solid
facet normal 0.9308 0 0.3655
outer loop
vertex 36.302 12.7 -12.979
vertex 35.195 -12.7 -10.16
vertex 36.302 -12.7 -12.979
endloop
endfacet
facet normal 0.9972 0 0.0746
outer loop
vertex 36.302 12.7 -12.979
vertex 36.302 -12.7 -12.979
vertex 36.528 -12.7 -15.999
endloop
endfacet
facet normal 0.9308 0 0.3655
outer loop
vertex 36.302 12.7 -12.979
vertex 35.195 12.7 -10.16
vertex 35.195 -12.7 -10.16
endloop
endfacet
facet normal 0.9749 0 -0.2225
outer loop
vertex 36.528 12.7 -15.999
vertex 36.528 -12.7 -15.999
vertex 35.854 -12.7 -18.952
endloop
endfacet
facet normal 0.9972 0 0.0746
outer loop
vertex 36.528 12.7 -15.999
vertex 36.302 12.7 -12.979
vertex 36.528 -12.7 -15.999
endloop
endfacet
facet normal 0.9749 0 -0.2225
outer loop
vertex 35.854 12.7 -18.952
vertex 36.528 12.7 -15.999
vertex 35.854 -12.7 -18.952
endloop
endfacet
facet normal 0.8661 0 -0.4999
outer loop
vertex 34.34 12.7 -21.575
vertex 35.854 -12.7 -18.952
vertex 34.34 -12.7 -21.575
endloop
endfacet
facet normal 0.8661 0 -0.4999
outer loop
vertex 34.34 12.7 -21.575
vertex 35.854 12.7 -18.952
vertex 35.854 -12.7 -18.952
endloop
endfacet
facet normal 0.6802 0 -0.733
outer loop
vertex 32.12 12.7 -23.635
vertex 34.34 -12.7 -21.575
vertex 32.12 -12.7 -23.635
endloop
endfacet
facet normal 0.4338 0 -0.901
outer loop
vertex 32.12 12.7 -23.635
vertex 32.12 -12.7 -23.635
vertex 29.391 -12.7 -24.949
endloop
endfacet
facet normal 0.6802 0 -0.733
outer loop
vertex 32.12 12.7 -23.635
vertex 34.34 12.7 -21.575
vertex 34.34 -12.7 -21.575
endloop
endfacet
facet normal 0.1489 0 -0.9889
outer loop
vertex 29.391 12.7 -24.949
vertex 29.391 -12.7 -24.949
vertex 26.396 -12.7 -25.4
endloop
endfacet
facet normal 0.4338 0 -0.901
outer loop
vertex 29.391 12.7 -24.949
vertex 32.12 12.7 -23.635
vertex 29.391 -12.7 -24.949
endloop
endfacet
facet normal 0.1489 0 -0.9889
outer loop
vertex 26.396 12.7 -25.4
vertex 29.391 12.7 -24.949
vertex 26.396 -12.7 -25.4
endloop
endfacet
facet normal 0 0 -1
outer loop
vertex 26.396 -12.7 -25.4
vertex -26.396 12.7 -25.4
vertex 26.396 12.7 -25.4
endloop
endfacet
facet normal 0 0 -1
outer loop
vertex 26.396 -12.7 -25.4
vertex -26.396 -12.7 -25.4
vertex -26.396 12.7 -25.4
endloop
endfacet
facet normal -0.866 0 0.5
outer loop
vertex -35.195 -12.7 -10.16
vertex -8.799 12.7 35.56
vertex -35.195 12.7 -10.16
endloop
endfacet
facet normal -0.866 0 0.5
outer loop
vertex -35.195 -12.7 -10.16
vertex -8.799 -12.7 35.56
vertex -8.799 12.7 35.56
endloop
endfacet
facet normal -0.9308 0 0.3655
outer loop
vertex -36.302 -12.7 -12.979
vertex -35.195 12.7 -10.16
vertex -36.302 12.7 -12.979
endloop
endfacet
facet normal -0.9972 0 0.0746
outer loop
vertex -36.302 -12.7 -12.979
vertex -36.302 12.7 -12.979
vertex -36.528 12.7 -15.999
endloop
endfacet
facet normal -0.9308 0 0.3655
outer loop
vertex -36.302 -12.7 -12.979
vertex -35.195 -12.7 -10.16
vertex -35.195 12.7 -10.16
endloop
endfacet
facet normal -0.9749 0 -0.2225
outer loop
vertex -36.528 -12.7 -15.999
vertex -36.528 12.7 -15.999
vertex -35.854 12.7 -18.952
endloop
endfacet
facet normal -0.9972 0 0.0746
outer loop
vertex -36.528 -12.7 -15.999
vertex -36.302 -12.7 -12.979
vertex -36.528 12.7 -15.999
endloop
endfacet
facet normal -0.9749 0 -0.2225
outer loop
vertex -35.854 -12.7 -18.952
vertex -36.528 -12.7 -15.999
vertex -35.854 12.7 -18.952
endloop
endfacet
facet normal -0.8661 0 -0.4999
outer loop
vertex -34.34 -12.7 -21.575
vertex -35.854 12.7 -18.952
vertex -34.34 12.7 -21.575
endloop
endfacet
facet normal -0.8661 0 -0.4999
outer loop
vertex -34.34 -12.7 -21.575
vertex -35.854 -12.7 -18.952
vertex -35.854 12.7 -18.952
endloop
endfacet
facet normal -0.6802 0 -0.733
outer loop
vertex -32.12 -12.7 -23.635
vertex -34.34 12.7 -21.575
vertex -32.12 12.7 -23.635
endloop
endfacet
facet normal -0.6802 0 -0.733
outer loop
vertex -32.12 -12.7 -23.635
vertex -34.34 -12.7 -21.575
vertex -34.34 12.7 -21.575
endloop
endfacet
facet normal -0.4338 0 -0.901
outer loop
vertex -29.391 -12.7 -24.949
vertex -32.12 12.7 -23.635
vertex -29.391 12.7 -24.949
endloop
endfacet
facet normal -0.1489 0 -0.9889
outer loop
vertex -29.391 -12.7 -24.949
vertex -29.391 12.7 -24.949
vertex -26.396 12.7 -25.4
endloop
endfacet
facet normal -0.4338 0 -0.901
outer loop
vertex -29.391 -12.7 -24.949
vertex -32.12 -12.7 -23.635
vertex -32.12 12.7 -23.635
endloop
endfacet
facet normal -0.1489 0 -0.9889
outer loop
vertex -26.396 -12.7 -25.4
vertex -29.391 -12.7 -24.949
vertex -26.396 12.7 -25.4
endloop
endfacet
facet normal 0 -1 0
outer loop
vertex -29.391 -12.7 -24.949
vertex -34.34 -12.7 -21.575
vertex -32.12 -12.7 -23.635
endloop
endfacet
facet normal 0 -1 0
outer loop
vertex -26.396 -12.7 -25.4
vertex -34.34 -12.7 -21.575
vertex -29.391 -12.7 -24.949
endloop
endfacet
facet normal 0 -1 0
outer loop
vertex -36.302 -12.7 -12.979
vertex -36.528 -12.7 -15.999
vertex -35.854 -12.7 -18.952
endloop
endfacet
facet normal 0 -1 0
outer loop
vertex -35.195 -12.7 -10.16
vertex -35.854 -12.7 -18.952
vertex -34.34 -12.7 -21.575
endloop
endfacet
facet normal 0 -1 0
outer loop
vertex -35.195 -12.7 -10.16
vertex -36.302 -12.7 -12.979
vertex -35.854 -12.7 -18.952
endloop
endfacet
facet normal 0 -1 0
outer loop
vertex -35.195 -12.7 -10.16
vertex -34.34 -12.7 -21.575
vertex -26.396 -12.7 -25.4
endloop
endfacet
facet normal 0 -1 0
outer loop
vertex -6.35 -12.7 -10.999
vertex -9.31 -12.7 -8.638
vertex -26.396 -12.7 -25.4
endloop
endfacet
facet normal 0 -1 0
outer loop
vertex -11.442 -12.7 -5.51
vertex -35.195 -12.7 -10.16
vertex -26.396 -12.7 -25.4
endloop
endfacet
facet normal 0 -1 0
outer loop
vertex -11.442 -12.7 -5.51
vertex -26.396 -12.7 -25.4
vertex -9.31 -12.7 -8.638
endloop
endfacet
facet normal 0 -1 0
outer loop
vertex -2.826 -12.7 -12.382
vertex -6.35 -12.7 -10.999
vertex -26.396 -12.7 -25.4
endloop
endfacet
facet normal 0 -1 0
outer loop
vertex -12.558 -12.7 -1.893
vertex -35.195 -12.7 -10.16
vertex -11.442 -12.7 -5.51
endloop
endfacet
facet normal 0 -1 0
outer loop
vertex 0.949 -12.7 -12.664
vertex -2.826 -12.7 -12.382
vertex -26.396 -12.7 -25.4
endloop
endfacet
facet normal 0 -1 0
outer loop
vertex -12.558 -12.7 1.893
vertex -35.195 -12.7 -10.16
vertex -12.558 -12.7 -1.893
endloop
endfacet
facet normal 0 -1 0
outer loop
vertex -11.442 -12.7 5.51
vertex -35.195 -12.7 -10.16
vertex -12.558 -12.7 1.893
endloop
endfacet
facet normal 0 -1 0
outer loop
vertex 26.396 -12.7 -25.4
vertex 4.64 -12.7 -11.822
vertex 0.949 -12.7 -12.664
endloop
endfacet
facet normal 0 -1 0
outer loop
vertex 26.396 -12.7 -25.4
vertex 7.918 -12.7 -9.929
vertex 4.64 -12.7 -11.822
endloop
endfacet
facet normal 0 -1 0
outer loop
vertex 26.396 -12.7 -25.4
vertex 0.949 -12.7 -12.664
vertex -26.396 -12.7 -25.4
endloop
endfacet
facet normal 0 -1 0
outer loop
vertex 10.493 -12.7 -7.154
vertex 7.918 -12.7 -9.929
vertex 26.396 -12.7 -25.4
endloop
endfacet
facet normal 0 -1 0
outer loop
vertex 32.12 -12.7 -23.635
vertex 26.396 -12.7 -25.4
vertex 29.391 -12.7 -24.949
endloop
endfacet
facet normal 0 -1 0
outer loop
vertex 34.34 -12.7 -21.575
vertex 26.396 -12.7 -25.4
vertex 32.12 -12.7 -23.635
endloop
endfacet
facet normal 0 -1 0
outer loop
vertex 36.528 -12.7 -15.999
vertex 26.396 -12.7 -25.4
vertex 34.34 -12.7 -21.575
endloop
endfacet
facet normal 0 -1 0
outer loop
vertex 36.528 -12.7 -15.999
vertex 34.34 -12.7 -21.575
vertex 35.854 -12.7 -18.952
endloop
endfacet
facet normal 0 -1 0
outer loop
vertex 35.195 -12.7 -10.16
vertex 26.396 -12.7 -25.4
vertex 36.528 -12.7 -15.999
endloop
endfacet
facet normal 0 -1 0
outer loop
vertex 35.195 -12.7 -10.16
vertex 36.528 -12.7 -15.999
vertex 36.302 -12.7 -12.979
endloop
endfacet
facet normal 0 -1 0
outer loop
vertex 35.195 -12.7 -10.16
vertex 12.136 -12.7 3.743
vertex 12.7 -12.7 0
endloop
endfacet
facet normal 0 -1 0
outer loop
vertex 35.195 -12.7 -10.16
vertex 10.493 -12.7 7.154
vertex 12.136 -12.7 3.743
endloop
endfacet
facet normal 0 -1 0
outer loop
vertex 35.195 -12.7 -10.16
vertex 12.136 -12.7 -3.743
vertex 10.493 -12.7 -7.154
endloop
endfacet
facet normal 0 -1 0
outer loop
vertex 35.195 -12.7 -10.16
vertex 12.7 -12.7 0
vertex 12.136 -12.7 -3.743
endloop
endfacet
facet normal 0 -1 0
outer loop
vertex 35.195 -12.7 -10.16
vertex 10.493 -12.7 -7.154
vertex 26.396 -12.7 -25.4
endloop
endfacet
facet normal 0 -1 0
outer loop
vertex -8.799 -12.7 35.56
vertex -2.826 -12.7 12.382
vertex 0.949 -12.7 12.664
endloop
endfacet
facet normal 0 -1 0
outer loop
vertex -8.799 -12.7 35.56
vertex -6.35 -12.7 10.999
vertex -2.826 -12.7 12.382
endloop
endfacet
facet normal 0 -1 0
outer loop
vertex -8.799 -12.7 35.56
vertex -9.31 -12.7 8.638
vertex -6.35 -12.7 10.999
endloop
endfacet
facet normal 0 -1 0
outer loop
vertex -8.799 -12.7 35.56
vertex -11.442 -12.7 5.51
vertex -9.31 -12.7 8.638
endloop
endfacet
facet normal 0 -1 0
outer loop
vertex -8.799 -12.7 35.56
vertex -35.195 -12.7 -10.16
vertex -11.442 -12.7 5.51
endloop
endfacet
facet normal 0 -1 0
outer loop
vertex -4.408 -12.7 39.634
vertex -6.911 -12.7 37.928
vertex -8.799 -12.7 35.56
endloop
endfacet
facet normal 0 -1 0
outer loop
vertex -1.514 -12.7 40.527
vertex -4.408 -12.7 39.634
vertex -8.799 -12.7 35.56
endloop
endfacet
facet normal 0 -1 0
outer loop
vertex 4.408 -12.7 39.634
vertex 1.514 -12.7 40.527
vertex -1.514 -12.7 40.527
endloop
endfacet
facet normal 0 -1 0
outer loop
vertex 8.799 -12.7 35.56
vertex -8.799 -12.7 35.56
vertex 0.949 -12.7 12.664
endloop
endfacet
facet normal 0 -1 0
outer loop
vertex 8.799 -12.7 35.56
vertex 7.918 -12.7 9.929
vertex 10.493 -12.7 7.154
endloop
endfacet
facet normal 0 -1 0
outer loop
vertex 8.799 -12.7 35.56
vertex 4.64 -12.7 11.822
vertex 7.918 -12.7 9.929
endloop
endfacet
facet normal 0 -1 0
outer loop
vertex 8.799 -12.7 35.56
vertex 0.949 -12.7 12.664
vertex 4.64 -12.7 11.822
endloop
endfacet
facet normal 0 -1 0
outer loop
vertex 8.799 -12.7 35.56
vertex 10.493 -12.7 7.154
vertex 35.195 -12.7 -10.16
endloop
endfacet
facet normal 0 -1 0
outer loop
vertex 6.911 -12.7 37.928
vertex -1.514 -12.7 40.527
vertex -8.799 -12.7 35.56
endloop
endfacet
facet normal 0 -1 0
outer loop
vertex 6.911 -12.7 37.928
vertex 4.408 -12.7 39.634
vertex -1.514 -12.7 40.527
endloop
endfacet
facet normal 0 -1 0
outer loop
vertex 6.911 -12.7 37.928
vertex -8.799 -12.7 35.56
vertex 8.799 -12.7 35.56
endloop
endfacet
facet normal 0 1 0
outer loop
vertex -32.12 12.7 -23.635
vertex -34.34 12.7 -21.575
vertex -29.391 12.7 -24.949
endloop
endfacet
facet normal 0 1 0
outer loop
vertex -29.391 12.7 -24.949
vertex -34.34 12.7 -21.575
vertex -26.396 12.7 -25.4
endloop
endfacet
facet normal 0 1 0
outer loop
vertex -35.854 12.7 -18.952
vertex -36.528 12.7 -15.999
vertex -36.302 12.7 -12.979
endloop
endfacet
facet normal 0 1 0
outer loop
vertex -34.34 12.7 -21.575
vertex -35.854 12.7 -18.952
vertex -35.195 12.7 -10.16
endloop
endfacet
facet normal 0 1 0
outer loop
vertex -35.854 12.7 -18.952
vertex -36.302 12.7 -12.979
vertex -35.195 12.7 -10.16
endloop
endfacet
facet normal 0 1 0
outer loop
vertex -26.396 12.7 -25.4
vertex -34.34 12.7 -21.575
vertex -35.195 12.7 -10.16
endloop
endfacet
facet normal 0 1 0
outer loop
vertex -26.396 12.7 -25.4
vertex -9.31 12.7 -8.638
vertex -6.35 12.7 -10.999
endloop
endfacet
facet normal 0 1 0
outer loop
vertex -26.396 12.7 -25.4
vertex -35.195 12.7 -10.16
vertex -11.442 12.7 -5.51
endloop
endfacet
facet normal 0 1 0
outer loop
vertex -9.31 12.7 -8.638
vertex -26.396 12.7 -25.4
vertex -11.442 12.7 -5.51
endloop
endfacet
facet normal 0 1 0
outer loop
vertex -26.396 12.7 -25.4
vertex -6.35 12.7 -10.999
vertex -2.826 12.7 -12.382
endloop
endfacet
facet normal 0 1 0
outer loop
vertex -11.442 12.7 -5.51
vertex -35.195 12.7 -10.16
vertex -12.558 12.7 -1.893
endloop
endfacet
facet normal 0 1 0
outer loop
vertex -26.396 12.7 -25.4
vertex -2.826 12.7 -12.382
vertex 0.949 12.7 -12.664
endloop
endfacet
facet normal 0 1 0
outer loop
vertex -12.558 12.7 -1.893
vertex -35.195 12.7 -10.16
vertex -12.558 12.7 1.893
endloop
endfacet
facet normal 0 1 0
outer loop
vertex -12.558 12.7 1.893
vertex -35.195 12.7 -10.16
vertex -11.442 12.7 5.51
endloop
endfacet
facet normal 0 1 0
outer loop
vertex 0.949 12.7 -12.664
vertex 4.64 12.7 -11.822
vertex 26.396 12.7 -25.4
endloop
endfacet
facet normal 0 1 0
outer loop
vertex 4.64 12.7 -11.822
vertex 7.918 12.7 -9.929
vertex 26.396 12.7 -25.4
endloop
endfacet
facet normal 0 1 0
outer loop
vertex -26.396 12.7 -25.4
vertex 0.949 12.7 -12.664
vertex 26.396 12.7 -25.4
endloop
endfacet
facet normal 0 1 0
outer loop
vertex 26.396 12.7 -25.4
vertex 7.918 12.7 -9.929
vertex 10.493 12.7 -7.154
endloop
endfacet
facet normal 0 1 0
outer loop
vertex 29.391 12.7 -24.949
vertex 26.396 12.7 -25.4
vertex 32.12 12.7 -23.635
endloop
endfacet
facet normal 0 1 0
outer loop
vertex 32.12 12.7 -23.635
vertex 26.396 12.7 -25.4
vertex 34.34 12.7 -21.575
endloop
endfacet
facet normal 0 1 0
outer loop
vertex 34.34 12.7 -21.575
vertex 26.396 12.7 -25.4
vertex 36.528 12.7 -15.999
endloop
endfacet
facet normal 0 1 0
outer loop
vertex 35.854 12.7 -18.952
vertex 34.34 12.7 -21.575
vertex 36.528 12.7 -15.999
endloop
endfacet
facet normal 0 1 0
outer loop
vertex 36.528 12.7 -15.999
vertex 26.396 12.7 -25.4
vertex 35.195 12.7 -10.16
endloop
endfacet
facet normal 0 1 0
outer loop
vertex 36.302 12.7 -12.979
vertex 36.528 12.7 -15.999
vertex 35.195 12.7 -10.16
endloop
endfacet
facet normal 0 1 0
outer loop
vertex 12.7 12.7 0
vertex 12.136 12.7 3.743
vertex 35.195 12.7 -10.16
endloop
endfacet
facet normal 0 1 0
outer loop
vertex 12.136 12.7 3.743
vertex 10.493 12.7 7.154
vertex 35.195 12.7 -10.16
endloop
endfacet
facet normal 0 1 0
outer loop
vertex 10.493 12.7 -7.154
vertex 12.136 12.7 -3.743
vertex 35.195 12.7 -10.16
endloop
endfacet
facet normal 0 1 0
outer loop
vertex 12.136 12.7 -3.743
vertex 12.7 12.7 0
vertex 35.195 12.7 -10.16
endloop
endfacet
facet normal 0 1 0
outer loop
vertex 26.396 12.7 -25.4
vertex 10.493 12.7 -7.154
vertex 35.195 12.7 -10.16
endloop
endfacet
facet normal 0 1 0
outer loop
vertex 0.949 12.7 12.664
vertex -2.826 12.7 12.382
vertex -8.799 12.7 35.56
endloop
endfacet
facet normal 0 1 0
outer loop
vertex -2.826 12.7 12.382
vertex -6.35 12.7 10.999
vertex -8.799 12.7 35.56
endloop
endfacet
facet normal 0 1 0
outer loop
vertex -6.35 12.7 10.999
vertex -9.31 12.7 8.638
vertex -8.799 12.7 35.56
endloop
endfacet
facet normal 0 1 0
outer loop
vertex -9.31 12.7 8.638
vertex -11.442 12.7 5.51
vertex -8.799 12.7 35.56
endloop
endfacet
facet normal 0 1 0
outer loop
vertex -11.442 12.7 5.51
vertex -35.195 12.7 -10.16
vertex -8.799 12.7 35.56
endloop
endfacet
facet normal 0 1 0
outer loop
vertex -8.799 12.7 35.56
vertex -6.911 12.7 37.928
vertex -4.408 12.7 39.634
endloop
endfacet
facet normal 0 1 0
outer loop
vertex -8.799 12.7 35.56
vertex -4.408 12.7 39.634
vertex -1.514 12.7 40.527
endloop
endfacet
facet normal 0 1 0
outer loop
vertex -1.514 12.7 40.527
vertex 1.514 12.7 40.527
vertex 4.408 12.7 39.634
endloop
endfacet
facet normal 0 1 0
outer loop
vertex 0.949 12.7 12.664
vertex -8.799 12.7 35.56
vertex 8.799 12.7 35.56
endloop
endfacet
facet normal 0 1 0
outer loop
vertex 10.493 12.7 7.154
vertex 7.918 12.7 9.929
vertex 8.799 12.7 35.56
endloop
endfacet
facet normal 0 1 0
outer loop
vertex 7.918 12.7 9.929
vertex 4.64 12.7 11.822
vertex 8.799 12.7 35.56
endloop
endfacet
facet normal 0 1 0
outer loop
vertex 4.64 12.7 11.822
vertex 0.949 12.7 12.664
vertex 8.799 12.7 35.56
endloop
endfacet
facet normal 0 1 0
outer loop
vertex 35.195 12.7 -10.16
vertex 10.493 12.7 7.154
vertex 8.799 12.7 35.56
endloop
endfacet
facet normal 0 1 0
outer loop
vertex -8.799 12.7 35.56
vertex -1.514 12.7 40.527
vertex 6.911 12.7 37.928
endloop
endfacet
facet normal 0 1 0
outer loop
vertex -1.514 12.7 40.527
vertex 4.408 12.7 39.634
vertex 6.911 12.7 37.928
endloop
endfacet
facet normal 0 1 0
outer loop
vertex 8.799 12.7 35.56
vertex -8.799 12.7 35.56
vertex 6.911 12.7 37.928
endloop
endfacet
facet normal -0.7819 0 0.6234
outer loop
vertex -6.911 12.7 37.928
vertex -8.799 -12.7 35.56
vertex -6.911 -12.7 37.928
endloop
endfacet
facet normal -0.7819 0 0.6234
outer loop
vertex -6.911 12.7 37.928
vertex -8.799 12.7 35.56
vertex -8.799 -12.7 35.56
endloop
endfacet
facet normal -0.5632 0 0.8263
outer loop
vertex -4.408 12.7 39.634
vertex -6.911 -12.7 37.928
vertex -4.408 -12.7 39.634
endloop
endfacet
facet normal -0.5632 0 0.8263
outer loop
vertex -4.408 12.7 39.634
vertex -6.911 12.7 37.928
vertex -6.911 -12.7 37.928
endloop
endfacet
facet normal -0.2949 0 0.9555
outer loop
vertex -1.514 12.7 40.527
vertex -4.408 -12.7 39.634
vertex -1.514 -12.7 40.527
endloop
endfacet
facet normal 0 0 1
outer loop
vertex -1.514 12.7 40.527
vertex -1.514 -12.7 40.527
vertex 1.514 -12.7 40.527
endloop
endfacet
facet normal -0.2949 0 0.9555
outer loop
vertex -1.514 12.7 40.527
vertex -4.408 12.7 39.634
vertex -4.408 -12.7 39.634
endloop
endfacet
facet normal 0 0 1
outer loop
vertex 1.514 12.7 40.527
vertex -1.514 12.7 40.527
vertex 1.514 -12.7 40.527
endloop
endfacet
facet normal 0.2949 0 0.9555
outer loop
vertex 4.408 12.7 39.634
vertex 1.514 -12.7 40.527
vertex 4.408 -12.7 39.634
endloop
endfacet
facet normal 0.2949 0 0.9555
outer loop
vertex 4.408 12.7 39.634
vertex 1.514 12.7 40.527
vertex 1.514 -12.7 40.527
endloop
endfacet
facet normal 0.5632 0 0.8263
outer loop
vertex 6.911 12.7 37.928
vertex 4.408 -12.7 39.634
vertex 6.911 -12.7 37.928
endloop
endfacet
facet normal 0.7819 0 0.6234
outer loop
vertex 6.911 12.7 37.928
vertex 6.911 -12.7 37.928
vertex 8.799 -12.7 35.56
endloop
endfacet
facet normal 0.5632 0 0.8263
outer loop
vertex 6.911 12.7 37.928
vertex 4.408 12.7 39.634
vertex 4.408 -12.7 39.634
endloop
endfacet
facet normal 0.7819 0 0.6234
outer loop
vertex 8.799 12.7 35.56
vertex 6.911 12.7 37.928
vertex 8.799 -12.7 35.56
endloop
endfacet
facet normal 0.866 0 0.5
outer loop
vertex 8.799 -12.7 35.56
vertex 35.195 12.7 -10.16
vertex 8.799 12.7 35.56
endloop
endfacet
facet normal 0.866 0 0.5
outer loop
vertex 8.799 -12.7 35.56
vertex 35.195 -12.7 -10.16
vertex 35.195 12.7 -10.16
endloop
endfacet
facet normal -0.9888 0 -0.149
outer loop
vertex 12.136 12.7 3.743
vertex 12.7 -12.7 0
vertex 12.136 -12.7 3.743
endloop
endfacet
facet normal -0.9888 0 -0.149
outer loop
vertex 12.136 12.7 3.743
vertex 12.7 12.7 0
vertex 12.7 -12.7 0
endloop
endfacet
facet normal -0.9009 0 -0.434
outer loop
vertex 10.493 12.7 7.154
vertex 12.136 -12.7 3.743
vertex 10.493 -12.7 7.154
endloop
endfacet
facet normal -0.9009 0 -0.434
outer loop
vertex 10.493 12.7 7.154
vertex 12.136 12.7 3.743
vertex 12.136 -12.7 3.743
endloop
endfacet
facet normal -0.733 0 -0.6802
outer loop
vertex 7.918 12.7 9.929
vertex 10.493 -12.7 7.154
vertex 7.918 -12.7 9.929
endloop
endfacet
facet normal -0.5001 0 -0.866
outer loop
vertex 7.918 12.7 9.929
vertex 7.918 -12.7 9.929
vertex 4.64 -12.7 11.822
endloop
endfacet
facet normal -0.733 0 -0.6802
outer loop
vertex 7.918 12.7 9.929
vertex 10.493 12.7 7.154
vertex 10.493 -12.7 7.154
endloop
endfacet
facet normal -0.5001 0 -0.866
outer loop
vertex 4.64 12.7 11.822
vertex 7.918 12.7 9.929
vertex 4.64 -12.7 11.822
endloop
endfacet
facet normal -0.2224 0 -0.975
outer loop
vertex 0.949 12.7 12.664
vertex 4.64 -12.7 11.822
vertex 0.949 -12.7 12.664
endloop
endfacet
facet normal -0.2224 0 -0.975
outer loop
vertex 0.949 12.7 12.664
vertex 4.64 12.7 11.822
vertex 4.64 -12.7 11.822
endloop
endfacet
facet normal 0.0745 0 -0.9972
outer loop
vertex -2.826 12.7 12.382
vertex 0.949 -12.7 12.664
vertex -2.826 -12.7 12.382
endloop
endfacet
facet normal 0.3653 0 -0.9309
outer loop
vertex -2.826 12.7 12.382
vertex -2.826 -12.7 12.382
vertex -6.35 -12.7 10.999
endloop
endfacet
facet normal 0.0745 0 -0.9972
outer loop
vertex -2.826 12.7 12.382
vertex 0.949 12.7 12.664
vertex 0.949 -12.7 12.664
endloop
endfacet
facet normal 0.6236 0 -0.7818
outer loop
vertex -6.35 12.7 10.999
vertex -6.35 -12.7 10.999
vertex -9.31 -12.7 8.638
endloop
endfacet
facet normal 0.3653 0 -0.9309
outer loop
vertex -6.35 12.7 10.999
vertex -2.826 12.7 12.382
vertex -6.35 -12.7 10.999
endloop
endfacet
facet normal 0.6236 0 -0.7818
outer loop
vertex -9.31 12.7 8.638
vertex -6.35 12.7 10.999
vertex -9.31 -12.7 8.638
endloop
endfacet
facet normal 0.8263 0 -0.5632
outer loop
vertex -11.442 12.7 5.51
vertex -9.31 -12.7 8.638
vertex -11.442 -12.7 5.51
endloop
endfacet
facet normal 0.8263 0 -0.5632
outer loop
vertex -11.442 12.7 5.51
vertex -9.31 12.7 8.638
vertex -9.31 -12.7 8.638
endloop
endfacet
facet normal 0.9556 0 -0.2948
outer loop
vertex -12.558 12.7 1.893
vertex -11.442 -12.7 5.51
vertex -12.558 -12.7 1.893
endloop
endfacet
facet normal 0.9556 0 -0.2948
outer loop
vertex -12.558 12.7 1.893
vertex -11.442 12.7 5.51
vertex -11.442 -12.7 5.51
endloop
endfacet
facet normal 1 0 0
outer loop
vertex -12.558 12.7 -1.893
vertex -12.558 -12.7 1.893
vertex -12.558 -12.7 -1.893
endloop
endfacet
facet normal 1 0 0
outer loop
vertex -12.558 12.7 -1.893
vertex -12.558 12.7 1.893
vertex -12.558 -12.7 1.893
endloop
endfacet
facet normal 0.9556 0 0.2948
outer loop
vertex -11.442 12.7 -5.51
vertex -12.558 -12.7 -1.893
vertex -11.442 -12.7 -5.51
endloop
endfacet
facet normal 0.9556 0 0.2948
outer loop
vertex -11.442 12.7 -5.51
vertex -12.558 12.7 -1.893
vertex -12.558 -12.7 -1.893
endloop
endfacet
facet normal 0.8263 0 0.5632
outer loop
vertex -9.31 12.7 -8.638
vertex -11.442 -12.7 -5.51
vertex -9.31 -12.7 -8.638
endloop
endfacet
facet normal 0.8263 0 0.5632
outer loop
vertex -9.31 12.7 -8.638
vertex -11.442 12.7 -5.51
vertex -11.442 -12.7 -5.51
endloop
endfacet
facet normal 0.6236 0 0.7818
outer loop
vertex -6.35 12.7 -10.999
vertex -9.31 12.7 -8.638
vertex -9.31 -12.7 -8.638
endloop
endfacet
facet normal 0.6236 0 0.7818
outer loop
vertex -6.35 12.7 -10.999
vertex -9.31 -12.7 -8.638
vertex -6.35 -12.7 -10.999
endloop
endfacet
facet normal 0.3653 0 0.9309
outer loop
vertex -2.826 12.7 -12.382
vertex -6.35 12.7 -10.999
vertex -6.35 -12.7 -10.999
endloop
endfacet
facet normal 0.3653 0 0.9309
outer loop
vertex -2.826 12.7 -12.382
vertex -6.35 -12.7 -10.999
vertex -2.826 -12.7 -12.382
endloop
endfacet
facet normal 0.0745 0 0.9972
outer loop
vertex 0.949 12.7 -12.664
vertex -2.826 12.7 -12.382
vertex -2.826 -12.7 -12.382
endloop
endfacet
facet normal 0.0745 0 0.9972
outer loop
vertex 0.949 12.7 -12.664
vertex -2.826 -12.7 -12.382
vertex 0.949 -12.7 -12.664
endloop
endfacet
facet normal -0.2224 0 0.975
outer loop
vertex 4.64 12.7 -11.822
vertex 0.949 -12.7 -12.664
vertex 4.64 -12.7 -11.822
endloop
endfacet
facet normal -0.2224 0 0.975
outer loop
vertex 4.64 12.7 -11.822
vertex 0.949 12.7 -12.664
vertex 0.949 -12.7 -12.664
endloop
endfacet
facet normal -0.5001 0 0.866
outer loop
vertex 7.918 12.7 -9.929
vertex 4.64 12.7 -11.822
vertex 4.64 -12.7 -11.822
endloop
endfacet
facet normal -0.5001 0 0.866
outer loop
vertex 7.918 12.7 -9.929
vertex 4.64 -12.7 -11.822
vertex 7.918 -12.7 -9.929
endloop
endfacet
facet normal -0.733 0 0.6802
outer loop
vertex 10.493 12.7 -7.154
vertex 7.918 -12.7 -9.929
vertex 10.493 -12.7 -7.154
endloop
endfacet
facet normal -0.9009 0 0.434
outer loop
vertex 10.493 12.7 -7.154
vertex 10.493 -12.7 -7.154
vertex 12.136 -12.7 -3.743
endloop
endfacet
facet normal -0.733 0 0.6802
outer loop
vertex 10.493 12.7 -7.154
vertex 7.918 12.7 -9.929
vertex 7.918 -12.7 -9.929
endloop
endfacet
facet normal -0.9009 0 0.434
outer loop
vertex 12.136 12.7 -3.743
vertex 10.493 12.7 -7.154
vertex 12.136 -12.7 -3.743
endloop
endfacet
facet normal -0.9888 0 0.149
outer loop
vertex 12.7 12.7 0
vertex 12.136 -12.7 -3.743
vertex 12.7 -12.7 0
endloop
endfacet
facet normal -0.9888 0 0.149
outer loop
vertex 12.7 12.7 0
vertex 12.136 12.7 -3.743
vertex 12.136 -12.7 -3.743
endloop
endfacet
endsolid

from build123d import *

# Parameters (mm, degrees)
F0_R     = 12.7
F1_DEPTH = 12.7
F2_R     = 10.16


with BuildPart() as f1:
    # F0 (on Front) → F1 (new body, symmetric)
    with BuildSketch(Plane.XZ):
        Polygon((0, 50.8), (-43.994091, -25.4), (43.994091, -25.4), align=None)
        Circle(F0_R, mode=Mode.SUBTRACT)
    extrude(amount=F1_DEPTH, both=True)

    # F2
    f2_edges = [f1.edges().sort_by_distance(p)[0] for p in [
        (-43.994091, 0, -25.4),
        (43.994091, 0, -25.4),
        (0, 0, 50.8),
    ]]
    fillet(f2_edges, radius=F2_R)


solid = f1.part
